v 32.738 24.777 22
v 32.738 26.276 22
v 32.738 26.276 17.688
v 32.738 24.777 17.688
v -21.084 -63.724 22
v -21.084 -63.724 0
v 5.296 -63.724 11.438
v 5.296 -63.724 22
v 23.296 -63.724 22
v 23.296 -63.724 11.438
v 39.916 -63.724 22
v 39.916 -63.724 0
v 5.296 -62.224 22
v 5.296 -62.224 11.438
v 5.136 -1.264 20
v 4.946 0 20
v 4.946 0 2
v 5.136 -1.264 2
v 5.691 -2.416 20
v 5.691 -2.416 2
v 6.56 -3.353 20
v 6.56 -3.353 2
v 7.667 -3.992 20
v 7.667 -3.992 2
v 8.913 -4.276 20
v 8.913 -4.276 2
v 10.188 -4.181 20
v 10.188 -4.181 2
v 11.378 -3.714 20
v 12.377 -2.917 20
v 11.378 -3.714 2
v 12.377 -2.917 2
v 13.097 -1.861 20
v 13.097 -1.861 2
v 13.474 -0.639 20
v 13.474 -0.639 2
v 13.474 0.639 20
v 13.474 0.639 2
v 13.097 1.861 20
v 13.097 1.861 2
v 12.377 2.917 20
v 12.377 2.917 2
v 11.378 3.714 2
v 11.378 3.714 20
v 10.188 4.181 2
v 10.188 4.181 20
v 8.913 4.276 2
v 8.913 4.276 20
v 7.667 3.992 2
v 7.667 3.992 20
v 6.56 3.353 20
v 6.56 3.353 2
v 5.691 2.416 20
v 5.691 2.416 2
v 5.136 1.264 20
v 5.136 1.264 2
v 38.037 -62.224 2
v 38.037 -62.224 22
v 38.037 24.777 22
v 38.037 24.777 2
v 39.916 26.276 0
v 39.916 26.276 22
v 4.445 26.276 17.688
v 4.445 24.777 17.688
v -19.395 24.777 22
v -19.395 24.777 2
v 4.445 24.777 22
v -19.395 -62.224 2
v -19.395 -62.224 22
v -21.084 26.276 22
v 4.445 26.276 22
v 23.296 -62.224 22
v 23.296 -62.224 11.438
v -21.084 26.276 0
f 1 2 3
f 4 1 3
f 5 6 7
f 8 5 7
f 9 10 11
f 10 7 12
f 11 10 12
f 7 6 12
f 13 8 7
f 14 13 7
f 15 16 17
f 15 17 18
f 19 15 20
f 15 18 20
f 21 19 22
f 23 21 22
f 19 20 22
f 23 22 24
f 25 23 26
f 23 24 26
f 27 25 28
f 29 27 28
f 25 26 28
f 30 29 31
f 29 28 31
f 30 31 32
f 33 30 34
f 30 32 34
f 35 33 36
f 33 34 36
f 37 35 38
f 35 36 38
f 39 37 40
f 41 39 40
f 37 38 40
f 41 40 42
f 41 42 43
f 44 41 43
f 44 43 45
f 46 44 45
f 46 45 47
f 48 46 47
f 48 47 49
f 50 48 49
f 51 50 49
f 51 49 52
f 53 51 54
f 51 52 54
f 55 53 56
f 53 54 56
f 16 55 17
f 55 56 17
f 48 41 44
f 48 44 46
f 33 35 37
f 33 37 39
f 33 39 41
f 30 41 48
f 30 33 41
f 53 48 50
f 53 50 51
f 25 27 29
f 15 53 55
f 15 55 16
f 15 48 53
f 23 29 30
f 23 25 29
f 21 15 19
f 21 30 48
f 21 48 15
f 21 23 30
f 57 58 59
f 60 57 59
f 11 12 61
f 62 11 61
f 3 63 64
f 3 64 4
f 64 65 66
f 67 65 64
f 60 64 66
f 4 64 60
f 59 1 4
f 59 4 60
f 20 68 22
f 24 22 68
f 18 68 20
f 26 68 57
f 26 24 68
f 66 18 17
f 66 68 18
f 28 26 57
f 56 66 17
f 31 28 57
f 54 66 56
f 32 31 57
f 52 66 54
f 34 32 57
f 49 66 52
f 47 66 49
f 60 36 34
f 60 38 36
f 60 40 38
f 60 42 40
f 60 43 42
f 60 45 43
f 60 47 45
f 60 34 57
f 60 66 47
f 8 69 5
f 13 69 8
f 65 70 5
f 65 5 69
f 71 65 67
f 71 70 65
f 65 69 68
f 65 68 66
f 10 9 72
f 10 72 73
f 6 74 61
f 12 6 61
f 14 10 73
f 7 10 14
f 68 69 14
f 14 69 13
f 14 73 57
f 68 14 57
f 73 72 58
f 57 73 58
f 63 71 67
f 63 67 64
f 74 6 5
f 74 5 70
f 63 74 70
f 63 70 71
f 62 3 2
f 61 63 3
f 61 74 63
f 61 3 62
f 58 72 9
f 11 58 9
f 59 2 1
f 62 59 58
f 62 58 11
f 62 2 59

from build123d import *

# Parameters (mm, degrees)
SCHIZZO1_W                   = 61
SCHIZZO1_H                   = 90
ESTRUSIONE_ESTRUSIONE1_DEPTH = 22
SCHIZZO2_W                   = 57.432150226
SCHIZZO2_H                   = 87.001178066
TAGLIO_ESTRUSIONE1_DEPTH     = 20
SCHIZZO3_R                   = 4.288113478
ESTRUSIONE_ESTRUSIONE3_DEPTH = 18
SCHIZZO4_W                   = 18
SCHIZZO4_H                   = 14
TAGLIO_ESTRUSIONE2_DEPTH     = 4
SCHIZZO5_W                   = 28.293055574
SCHIZZO5_H                   = 7.859182103
TAGLIO_ESTRUSIONE4_DEPTH     = 4


with BuildPart() as part:
    # Schizzo1 → Estrusione-Estrusione1 (new body)
    with BuildSketch(Plane.XY):
        with Locations((9.416083916, -18.723776224)):
            Rectangle(SCHIZZO1_W, SCHIZZO1_H)
    extrude(amount=ESTRUSIONE_ESTRUSIONE1_DEPTH)

    # Schizzo2 → Taglio-Estrusione1 (cut)
    with BuildSketch(Plane.XY.offset(22)):
        with Locations((9.321311391, -18.723776224)):
            Rectangle(SCHIZZO2_W, SCHIZZO2_H)
    extrude(amount=-TAGLIO_ESTRUSIONE1_DEPTH, mode=Mode.SUBTRACT)

    # Schizzo3 → Estrusione-Estrusione3 (add)
    with BuildSketch(Plane.XY.offset(2)):
        with Locations(Location((9.233810508, 0, 0), (0, 0, 180))):
            Circle(SCHIZZO3_R)
    extrude(amount=ESTRUSIONE_ESTRUSIONE3_DEPTH)

    # Schizzo4 → Taglio-Estrusione2 (cut)
    with BuildSketch(Plane(origin=(0, -63.723776224, 0), x_dir=(-1, 0, 0), z_dir=(0, -1, 0))):
        with Locations((-14.296265354, -18.438108628)):
            Rectangle(SCHIZZO4_W, SCHIZZO4_H)
    extrude(amount=-TAGLIO_ESTRUSIONE2_DEPTH, mode=Mode.SUBTRACT)

    # Schizzo5 → Taglio-Estrusione4 (cut)
    with BuildSketch(Plane(origin=(0, 26.276223776, 0), x_dir=(1, 0, 0), z_dir=(0, 1, 0))):
        with Locations((18.59196137, -21.617439903)):
            Rectangle(SCHIZZO5_W, SCHIZZO5_H)
    extrude(amount=-TAGLIO_ESTRUSIONE4_DEPTH, mode=Mode.SUBTRACT)


solid = part.part
